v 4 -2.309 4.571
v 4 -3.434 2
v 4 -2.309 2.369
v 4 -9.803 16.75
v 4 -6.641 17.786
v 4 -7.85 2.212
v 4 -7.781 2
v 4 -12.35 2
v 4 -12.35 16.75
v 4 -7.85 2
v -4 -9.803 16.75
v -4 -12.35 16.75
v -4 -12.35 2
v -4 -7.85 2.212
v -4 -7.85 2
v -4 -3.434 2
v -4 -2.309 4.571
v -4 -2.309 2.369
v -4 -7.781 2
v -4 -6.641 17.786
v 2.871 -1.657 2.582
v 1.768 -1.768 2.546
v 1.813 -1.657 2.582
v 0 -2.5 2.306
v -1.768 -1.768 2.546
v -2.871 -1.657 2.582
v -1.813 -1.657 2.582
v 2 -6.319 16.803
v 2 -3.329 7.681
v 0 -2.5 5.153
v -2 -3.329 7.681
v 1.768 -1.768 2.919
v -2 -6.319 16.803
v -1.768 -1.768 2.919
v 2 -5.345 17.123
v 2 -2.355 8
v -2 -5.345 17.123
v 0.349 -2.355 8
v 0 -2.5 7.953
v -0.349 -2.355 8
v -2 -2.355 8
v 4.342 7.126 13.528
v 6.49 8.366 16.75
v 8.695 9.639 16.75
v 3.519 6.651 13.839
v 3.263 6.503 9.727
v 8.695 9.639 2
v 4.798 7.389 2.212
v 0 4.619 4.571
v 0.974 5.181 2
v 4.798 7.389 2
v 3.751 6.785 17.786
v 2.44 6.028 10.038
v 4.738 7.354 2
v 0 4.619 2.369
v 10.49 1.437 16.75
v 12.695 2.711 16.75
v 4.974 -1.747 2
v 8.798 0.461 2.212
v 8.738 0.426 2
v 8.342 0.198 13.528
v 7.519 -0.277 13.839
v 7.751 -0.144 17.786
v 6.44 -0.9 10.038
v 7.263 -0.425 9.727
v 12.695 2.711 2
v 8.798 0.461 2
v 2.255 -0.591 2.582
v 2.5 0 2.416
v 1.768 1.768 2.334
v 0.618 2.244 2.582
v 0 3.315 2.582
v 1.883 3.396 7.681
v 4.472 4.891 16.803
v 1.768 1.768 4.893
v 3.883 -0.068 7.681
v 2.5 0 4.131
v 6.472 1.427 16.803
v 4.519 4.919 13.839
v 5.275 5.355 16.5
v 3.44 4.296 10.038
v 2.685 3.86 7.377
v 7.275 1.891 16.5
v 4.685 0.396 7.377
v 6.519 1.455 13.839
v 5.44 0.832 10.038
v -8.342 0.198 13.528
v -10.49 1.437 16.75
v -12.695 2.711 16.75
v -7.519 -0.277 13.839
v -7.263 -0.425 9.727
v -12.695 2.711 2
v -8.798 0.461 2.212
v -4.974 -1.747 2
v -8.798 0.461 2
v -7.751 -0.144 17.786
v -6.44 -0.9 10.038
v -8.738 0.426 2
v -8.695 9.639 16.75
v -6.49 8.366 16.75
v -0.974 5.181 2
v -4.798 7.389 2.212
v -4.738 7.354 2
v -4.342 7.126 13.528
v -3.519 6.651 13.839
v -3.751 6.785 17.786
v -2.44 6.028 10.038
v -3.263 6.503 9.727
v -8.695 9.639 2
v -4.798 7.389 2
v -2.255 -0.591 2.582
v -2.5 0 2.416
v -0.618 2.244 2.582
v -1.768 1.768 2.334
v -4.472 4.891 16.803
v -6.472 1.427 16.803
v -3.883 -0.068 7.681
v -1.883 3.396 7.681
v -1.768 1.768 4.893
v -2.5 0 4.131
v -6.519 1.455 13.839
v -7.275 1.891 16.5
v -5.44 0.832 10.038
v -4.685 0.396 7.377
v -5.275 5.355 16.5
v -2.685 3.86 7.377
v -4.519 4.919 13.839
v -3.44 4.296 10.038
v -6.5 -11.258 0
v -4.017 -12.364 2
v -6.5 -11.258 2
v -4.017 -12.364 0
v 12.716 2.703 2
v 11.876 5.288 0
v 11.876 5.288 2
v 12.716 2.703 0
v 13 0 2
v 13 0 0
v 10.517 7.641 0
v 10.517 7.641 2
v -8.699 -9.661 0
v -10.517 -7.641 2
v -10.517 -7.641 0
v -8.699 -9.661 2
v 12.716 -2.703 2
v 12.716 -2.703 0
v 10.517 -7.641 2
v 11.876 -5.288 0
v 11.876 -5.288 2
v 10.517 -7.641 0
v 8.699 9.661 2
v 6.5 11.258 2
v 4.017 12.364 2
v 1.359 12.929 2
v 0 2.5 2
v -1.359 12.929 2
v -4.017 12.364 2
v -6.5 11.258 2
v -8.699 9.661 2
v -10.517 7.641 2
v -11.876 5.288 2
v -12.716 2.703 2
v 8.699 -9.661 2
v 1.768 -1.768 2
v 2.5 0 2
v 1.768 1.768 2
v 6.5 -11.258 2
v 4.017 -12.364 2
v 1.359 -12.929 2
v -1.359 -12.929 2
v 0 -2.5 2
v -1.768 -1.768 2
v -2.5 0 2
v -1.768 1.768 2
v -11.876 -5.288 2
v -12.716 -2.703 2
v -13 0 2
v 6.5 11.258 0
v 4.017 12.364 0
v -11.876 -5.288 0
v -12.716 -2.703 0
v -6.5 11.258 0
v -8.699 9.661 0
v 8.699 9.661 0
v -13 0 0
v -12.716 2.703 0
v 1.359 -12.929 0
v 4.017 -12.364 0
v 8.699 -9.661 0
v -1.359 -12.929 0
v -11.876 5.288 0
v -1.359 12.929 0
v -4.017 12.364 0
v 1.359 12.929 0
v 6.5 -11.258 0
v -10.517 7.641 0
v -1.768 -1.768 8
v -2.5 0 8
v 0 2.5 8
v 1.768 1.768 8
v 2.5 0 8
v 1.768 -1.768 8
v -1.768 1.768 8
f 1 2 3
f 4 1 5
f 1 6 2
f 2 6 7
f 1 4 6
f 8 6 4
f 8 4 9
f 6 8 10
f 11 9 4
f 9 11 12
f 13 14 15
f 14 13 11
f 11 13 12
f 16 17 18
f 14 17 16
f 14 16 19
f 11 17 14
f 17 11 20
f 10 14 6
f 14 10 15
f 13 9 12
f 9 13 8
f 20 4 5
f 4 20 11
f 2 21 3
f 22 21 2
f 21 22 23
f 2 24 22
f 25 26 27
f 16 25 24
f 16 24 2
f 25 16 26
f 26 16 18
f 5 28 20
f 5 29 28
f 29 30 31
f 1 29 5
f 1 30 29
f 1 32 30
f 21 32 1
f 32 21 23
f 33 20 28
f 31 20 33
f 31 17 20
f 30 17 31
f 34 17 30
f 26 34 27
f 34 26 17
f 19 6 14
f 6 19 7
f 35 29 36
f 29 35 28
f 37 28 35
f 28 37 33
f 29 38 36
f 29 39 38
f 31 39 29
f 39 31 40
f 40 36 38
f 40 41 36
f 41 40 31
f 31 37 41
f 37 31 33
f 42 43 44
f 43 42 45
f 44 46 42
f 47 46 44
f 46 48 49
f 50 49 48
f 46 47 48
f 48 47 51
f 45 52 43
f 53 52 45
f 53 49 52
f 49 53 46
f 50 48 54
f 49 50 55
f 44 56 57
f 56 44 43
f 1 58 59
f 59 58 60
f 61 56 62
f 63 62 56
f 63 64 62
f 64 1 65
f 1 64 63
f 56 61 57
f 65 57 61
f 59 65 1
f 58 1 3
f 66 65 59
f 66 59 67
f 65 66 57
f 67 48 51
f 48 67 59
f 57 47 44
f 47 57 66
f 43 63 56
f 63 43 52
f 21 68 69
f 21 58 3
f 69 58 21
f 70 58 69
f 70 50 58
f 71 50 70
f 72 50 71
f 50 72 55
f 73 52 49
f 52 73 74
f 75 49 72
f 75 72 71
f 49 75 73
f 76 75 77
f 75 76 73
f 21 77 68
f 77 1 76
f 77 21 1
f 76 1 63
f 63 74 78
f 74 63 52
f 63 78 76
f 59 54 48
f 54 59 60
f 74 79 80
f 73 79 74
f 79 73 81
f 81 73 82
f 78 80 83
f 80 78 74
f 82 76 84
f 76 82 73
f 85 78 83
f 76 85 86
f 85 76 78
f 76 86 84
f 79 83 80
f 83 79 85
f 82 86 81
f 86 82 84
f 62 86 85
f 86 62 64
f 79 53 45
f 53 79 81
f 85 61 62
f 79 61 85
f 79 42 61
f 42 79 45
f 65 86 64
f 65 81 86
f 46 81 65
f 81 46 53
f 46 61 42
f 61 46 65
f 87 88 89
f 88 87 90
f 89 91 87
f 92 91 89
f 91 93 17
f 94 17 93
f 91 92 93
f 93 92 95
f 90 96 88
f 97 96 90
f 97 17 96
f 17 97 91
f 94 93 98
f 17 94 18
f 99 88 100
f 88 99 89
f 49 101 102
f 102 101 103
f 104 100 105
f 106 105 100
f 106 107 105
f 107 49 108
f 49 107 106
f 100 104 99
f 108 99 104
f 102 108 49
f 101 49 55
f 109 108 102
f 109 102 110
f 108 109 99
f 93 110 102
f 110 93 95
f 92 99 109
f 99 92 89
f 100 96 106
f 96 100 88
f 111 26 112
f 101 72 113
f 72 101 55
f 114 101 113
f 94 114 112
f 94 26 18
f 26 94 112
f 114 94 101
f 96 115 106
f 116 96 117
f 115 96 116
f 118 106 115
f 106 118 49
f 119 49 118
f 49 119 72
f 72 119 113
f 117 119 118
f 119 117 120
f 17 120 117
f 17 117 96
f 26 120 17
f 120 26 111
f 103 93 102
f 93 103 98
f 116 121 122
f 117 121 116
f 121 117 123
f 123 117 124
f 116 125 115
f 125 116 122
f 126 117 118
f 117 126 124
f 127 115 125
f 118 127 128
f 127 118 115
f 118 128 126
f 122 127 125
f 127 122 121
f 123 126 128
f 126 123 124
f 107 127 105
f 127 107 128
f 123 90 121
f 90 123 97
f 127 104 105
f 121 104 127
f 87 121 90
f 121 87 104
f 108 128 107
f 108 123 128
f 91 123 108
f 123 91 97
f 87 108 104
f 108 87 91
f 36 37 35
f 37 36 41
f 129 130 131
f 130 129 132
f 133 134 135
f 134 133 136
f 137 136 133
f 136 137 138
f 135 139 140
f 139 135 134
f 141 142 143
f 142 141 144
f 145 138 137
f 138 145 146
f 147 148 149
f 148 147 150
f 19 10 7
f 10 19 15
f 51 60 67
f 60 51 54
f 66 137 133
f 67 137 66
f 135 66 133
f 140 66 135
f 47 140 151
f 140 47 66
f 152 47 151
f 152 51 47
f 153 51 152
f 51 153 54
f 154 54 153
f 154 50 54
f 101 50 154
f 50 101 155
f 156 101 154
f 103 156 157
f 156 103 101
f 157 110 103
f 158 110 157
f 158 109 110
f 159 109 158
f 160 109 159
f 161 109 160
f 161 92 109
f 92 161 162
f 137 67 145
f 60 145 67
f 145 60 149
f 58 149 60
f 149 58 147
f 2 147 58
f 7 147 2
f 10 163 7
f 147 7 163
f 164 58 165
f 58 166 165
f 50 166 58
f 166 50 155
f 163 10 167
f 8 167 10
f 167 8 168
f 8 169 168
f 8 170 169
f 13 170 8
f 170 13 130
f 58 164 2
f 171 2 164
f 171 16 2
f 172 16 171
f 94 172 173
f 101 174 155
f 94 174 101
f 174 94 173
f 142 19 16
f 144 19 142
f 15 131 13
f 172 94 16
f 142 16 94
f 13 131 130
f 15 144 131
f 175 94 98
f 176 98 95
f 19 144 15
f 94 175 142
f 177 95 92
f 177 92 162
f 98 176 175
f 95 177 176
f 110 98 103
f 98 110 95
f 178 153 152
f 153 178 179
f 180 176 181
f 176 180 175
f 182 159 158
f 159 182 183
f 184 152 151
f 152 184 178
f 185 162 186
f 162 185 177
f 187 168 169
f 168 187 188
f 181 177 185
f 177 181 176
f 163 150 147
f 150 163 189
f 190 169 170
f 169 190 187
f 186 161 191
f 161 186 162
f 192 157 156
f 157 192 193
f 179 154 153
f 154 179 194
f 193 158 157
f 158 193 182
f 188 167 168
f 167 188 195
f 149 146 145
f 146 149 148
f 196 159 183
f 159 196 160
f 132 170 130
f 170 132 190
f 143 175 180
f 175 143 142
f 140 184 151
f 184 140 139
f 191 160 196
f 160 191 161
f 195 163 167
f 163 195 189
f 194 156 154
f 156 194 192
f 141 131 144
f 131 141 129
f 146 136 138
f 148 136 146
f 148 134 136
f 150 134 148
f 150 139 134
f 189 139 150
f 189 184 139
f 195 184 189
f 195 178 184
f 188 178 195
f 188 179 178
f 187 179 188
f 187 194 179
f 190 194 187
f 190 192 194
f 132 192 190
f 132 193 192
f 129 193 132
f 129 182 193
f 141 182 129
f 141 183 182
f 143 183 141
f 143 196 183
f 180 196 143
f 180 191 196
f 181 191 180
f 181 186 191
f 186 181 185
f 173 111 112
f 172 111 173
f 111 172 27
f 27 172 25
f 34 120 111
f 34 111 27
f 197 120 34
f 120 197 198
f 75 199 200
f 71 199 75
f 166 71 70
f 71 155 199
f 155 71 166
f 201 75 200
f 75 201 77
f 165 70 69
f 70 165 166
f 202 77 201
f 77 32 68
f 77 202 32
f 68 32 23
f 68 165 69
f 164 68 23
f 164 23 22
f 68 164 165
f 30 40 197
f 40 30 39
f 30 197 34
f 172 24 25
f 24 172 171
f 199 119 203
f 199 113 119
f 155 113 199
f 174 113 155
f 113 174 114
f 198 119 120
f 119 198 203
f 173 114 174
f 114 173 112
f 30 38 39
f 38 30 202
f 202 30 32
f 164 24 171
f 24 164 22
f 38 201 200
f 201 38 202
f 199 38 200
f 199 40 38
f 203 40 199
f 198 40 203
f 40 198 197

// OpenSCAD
//will need a few more parameters
mainh = 16.5;
outby = -7;
magnet_inwards = 2.2;
swidth = 8;
below_mags = 3;
rotation = asin(19/61);

//whole set up
cylinder(r=13,h=2);
translate([0,0,mainh/2+1]) for(i = [0,120,240]){
  rotate([0,0,i]) translate([0,outby,0]){
    difference(){
      support(mainh, swidth, rotation=rotation);
      translate([0,magnet_inwards,below_mags]) magnet(swidth=swidth, rotation=rotation);
    }
  }
}
translate([0,outby + magnet_inwards,mainh/2+below_mags + 1]) magnet(rotation=rotation, swidth=swidth);

// support structure
module support(mainh=16, swidth=10, rotation=25){
  translate([0,-3.1,0]) cube([swidth,4.5,15], center=true);
  rotate([rotation,0,0]){
    cube([swidth,6,16], center=true);
  }
}

// magnet
module magnet(x=4, y=2, z=9.6, swidth=10, rotation=25){
  rotate([rotation,0,0]){
    union(){
      cube([x,y,z], center=true);
      translate([0,-y/2-0.5,0]) color("red") cube([swidth, 1, 4], center=true);
    }
  }
}
//dummy cylindar for space needed by tube at bottom
color("blue") cylinder(r=2.5,h=8);
